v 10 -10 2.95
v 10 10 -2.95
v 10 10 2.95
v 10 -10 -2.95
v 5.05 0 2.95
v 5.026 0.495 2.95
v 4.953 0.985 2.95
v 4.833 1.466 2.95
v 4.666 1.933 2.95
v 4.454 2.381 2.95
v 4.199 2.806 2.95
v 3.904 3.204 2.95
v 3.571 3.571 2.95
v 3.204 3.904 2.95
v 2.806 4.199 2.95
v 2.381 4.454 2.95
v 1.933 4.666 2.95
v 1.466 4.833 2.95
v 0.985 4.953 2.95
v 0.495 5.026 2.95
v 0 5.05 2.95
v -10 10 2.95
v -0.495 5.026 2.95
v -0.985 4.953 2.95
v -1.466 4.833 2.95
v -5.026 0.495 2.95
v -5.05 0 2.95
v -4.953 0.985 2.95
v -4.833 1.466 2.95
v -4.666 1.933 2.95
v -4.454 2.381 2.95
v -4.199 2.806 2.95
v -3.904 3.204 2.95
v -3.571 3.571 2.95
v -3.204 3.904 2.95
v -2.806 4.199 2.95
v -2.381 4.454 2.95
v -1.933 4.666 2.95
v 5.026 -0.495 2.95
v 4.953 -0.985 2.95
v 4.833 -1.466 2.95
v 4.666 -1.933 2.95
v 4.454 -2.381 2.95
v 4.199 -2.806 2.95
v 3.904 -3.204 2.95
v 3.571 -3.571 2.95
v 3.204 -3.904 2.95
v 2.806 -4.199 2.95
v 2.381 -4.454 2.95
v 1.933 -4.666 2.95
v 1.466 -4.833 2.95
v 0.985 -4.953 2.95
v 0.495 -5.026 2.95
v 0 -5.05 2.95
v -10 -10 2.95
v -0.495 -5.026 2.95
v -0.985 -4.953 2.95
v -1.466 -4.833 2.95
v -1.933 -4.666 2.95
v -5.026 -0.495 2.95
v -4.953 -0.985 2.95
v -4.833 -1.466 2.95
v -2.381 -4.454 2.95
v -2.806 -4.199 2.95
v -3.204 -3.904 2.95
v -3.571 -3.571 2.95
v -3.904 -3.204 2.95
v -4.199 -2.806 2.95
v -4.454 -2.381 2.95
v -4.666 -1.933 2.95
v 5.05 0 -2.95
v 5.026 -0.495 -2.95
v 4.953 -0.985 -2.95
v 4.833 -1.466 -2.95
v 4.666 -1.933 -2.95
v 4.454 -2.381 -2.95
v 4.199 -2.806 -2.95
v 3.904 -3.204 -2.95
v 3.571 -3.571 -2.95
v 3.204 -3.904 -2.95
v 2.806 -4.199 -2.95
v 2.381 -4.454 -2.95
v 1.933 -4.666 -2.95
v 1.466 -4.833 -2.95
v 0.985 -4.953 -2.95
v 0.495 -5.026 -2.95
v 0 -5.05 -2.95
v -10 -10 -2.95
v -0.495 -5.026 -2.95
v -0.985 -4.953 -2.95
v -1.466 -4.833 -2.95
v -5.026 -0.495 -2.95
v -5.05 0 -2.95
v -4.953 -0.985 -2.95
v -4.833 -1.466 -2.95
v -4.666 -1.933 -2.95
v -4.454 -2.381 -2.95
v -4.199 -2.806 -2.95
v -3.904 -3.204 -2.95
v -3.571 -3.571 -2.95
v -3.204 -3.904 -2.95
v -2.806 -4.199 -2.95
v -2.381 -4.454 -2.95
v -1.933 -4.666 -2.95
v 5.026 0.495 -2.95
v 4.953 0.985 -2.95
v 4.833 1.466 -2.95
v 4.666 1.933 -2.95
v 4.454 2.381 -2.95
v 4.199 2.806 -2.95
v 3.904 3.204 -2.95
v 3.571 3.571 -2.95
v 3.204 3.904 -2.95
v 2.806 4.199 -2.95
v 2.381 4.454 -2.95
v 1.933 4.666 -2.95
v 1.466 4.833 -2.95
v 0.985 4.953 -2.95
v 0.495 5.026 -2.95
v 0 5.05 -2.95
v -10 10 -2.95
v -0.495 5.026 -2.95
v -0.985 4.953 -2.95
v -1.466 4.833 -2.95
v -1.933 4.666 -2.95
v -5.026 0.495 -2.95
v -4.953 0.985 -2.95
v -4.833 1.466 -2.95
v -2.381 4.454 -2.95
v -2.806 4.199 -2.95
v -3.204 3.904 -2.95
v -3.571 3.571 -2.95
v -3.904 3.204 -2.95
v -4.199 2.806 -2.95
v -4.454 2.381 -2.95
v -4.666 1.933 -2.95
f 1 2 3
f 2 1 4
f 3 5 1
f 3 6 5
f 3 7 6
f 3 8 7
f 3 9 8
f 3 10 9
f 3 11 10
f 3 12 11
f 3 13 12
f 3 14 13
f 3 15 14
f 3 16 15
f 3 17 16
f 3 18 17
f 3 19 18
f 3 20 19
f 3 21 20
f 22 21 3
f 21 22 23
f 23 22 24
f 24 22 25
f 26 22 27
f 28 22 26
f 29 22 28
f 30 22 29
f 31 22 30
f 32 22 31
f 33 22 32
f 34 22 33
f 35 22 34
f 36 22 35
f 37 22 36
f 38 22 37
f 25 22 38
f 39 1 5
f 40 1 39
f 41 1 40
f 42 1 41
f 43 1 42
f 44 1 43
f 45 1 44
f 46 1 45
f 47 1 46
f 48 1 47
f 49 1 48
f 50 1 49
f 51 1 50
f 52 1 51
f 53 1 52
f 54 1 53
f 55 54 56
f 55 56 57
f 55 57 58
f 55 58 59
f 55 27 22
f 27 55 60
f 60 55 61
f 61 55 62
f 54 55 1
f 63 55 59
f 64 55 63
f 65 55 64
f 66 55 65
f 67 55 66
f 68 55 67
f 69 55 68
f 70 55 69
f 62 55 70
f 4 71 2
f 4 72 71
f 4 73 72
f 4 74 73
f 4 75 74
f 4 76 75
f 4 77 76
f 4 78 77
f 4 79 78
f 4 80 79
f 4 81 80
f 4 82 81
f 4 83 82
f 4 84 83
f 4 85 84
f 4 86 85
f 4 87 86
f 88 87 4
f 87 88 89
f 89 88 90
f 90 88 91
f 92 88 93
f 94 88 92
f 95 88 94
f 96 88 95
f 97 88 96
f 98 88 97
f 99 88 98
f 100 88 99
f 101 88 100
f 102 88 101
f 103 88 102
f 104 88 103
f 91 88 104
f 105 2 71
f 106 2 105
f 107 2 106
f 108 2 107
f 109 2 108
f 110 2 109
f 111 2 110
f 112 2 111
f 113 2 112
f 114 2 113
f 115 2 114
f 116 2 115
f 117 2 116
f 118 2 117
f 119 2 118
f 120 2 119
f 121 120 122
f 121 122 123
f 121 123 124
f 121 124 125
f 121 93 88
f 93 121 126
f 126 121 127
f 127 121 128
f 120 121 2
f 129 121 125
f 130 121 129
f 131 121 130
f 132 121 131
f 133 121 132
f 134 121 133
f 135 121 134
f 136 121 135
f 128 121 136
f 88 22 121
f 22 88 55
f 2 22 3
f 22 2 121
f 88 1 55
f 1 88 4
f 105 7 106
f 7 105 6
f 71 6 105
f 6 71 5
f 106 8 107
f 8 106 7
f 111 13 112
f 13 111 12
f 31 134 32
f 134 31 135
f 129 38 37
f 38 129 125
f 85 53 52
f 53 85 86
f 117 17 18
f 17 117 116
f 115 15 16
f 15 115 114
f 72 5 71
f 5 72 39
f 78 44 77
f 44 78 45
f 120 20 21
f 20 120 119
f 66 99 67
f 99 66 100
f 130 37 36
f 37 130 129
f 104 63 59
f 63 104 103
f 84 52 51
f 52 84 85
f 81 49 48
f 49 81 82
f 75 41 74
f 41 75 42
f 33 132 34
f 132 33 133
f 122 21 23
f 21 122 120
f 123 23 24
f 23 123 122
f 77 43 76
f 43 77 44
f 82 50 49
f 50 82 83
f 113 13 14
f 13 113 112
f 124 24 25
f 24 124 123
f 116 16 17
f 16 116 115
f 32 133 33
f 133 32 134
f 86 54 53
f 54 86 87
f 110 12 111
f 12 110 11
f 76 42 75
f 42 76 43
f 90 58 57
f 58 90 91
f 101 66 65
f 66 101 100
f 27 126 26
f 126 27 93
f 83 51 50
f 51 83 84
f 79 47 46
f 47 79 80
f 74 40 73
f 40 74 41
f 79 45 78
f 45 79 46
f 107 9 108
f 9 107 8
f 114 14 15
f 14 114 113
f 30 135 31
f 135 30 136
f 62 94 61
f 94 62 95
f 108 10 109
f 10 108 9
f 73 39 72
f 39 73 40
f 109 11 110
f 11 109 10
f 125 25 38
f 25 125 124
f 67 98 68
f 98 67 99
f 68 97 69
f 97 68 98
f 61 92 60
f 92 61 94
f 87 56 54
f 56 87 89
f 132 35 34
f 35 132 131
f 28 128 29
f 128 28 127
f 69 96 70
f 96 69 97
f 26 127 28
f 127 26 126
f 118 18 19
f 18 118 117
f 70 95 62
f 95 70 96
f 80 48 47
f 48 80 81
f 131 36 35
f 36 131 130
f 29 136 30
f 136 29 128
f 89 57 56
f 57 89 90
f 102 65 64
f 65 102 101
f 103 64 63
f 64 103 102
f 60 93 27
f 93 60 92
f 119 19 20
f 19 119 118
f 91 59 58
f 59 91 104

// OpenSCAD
$fn=64;

module upper() {
    difference() {
        cube([20, 20, 5.9], center = true);
        cylinder(d=10.1, h=6, center = true);
    }
}

module lower() {
    // rotate([0,0,4]) translate([10, 0, 0]) cube([10, 30, 10], center = true);
    difference() {
        cube([30, 20, 5.9], center = true);
        union() {
            cylinder(d=10.1, h=6, center = true);
            rotate([0,0,9]) translate([16.5, 0, 0]) cube([10, 30, 6], center = true);
            translate([-15, 0, 0]) cube([10, 30, 6], center = true);
        }
    }
}

upper();

//lower();
